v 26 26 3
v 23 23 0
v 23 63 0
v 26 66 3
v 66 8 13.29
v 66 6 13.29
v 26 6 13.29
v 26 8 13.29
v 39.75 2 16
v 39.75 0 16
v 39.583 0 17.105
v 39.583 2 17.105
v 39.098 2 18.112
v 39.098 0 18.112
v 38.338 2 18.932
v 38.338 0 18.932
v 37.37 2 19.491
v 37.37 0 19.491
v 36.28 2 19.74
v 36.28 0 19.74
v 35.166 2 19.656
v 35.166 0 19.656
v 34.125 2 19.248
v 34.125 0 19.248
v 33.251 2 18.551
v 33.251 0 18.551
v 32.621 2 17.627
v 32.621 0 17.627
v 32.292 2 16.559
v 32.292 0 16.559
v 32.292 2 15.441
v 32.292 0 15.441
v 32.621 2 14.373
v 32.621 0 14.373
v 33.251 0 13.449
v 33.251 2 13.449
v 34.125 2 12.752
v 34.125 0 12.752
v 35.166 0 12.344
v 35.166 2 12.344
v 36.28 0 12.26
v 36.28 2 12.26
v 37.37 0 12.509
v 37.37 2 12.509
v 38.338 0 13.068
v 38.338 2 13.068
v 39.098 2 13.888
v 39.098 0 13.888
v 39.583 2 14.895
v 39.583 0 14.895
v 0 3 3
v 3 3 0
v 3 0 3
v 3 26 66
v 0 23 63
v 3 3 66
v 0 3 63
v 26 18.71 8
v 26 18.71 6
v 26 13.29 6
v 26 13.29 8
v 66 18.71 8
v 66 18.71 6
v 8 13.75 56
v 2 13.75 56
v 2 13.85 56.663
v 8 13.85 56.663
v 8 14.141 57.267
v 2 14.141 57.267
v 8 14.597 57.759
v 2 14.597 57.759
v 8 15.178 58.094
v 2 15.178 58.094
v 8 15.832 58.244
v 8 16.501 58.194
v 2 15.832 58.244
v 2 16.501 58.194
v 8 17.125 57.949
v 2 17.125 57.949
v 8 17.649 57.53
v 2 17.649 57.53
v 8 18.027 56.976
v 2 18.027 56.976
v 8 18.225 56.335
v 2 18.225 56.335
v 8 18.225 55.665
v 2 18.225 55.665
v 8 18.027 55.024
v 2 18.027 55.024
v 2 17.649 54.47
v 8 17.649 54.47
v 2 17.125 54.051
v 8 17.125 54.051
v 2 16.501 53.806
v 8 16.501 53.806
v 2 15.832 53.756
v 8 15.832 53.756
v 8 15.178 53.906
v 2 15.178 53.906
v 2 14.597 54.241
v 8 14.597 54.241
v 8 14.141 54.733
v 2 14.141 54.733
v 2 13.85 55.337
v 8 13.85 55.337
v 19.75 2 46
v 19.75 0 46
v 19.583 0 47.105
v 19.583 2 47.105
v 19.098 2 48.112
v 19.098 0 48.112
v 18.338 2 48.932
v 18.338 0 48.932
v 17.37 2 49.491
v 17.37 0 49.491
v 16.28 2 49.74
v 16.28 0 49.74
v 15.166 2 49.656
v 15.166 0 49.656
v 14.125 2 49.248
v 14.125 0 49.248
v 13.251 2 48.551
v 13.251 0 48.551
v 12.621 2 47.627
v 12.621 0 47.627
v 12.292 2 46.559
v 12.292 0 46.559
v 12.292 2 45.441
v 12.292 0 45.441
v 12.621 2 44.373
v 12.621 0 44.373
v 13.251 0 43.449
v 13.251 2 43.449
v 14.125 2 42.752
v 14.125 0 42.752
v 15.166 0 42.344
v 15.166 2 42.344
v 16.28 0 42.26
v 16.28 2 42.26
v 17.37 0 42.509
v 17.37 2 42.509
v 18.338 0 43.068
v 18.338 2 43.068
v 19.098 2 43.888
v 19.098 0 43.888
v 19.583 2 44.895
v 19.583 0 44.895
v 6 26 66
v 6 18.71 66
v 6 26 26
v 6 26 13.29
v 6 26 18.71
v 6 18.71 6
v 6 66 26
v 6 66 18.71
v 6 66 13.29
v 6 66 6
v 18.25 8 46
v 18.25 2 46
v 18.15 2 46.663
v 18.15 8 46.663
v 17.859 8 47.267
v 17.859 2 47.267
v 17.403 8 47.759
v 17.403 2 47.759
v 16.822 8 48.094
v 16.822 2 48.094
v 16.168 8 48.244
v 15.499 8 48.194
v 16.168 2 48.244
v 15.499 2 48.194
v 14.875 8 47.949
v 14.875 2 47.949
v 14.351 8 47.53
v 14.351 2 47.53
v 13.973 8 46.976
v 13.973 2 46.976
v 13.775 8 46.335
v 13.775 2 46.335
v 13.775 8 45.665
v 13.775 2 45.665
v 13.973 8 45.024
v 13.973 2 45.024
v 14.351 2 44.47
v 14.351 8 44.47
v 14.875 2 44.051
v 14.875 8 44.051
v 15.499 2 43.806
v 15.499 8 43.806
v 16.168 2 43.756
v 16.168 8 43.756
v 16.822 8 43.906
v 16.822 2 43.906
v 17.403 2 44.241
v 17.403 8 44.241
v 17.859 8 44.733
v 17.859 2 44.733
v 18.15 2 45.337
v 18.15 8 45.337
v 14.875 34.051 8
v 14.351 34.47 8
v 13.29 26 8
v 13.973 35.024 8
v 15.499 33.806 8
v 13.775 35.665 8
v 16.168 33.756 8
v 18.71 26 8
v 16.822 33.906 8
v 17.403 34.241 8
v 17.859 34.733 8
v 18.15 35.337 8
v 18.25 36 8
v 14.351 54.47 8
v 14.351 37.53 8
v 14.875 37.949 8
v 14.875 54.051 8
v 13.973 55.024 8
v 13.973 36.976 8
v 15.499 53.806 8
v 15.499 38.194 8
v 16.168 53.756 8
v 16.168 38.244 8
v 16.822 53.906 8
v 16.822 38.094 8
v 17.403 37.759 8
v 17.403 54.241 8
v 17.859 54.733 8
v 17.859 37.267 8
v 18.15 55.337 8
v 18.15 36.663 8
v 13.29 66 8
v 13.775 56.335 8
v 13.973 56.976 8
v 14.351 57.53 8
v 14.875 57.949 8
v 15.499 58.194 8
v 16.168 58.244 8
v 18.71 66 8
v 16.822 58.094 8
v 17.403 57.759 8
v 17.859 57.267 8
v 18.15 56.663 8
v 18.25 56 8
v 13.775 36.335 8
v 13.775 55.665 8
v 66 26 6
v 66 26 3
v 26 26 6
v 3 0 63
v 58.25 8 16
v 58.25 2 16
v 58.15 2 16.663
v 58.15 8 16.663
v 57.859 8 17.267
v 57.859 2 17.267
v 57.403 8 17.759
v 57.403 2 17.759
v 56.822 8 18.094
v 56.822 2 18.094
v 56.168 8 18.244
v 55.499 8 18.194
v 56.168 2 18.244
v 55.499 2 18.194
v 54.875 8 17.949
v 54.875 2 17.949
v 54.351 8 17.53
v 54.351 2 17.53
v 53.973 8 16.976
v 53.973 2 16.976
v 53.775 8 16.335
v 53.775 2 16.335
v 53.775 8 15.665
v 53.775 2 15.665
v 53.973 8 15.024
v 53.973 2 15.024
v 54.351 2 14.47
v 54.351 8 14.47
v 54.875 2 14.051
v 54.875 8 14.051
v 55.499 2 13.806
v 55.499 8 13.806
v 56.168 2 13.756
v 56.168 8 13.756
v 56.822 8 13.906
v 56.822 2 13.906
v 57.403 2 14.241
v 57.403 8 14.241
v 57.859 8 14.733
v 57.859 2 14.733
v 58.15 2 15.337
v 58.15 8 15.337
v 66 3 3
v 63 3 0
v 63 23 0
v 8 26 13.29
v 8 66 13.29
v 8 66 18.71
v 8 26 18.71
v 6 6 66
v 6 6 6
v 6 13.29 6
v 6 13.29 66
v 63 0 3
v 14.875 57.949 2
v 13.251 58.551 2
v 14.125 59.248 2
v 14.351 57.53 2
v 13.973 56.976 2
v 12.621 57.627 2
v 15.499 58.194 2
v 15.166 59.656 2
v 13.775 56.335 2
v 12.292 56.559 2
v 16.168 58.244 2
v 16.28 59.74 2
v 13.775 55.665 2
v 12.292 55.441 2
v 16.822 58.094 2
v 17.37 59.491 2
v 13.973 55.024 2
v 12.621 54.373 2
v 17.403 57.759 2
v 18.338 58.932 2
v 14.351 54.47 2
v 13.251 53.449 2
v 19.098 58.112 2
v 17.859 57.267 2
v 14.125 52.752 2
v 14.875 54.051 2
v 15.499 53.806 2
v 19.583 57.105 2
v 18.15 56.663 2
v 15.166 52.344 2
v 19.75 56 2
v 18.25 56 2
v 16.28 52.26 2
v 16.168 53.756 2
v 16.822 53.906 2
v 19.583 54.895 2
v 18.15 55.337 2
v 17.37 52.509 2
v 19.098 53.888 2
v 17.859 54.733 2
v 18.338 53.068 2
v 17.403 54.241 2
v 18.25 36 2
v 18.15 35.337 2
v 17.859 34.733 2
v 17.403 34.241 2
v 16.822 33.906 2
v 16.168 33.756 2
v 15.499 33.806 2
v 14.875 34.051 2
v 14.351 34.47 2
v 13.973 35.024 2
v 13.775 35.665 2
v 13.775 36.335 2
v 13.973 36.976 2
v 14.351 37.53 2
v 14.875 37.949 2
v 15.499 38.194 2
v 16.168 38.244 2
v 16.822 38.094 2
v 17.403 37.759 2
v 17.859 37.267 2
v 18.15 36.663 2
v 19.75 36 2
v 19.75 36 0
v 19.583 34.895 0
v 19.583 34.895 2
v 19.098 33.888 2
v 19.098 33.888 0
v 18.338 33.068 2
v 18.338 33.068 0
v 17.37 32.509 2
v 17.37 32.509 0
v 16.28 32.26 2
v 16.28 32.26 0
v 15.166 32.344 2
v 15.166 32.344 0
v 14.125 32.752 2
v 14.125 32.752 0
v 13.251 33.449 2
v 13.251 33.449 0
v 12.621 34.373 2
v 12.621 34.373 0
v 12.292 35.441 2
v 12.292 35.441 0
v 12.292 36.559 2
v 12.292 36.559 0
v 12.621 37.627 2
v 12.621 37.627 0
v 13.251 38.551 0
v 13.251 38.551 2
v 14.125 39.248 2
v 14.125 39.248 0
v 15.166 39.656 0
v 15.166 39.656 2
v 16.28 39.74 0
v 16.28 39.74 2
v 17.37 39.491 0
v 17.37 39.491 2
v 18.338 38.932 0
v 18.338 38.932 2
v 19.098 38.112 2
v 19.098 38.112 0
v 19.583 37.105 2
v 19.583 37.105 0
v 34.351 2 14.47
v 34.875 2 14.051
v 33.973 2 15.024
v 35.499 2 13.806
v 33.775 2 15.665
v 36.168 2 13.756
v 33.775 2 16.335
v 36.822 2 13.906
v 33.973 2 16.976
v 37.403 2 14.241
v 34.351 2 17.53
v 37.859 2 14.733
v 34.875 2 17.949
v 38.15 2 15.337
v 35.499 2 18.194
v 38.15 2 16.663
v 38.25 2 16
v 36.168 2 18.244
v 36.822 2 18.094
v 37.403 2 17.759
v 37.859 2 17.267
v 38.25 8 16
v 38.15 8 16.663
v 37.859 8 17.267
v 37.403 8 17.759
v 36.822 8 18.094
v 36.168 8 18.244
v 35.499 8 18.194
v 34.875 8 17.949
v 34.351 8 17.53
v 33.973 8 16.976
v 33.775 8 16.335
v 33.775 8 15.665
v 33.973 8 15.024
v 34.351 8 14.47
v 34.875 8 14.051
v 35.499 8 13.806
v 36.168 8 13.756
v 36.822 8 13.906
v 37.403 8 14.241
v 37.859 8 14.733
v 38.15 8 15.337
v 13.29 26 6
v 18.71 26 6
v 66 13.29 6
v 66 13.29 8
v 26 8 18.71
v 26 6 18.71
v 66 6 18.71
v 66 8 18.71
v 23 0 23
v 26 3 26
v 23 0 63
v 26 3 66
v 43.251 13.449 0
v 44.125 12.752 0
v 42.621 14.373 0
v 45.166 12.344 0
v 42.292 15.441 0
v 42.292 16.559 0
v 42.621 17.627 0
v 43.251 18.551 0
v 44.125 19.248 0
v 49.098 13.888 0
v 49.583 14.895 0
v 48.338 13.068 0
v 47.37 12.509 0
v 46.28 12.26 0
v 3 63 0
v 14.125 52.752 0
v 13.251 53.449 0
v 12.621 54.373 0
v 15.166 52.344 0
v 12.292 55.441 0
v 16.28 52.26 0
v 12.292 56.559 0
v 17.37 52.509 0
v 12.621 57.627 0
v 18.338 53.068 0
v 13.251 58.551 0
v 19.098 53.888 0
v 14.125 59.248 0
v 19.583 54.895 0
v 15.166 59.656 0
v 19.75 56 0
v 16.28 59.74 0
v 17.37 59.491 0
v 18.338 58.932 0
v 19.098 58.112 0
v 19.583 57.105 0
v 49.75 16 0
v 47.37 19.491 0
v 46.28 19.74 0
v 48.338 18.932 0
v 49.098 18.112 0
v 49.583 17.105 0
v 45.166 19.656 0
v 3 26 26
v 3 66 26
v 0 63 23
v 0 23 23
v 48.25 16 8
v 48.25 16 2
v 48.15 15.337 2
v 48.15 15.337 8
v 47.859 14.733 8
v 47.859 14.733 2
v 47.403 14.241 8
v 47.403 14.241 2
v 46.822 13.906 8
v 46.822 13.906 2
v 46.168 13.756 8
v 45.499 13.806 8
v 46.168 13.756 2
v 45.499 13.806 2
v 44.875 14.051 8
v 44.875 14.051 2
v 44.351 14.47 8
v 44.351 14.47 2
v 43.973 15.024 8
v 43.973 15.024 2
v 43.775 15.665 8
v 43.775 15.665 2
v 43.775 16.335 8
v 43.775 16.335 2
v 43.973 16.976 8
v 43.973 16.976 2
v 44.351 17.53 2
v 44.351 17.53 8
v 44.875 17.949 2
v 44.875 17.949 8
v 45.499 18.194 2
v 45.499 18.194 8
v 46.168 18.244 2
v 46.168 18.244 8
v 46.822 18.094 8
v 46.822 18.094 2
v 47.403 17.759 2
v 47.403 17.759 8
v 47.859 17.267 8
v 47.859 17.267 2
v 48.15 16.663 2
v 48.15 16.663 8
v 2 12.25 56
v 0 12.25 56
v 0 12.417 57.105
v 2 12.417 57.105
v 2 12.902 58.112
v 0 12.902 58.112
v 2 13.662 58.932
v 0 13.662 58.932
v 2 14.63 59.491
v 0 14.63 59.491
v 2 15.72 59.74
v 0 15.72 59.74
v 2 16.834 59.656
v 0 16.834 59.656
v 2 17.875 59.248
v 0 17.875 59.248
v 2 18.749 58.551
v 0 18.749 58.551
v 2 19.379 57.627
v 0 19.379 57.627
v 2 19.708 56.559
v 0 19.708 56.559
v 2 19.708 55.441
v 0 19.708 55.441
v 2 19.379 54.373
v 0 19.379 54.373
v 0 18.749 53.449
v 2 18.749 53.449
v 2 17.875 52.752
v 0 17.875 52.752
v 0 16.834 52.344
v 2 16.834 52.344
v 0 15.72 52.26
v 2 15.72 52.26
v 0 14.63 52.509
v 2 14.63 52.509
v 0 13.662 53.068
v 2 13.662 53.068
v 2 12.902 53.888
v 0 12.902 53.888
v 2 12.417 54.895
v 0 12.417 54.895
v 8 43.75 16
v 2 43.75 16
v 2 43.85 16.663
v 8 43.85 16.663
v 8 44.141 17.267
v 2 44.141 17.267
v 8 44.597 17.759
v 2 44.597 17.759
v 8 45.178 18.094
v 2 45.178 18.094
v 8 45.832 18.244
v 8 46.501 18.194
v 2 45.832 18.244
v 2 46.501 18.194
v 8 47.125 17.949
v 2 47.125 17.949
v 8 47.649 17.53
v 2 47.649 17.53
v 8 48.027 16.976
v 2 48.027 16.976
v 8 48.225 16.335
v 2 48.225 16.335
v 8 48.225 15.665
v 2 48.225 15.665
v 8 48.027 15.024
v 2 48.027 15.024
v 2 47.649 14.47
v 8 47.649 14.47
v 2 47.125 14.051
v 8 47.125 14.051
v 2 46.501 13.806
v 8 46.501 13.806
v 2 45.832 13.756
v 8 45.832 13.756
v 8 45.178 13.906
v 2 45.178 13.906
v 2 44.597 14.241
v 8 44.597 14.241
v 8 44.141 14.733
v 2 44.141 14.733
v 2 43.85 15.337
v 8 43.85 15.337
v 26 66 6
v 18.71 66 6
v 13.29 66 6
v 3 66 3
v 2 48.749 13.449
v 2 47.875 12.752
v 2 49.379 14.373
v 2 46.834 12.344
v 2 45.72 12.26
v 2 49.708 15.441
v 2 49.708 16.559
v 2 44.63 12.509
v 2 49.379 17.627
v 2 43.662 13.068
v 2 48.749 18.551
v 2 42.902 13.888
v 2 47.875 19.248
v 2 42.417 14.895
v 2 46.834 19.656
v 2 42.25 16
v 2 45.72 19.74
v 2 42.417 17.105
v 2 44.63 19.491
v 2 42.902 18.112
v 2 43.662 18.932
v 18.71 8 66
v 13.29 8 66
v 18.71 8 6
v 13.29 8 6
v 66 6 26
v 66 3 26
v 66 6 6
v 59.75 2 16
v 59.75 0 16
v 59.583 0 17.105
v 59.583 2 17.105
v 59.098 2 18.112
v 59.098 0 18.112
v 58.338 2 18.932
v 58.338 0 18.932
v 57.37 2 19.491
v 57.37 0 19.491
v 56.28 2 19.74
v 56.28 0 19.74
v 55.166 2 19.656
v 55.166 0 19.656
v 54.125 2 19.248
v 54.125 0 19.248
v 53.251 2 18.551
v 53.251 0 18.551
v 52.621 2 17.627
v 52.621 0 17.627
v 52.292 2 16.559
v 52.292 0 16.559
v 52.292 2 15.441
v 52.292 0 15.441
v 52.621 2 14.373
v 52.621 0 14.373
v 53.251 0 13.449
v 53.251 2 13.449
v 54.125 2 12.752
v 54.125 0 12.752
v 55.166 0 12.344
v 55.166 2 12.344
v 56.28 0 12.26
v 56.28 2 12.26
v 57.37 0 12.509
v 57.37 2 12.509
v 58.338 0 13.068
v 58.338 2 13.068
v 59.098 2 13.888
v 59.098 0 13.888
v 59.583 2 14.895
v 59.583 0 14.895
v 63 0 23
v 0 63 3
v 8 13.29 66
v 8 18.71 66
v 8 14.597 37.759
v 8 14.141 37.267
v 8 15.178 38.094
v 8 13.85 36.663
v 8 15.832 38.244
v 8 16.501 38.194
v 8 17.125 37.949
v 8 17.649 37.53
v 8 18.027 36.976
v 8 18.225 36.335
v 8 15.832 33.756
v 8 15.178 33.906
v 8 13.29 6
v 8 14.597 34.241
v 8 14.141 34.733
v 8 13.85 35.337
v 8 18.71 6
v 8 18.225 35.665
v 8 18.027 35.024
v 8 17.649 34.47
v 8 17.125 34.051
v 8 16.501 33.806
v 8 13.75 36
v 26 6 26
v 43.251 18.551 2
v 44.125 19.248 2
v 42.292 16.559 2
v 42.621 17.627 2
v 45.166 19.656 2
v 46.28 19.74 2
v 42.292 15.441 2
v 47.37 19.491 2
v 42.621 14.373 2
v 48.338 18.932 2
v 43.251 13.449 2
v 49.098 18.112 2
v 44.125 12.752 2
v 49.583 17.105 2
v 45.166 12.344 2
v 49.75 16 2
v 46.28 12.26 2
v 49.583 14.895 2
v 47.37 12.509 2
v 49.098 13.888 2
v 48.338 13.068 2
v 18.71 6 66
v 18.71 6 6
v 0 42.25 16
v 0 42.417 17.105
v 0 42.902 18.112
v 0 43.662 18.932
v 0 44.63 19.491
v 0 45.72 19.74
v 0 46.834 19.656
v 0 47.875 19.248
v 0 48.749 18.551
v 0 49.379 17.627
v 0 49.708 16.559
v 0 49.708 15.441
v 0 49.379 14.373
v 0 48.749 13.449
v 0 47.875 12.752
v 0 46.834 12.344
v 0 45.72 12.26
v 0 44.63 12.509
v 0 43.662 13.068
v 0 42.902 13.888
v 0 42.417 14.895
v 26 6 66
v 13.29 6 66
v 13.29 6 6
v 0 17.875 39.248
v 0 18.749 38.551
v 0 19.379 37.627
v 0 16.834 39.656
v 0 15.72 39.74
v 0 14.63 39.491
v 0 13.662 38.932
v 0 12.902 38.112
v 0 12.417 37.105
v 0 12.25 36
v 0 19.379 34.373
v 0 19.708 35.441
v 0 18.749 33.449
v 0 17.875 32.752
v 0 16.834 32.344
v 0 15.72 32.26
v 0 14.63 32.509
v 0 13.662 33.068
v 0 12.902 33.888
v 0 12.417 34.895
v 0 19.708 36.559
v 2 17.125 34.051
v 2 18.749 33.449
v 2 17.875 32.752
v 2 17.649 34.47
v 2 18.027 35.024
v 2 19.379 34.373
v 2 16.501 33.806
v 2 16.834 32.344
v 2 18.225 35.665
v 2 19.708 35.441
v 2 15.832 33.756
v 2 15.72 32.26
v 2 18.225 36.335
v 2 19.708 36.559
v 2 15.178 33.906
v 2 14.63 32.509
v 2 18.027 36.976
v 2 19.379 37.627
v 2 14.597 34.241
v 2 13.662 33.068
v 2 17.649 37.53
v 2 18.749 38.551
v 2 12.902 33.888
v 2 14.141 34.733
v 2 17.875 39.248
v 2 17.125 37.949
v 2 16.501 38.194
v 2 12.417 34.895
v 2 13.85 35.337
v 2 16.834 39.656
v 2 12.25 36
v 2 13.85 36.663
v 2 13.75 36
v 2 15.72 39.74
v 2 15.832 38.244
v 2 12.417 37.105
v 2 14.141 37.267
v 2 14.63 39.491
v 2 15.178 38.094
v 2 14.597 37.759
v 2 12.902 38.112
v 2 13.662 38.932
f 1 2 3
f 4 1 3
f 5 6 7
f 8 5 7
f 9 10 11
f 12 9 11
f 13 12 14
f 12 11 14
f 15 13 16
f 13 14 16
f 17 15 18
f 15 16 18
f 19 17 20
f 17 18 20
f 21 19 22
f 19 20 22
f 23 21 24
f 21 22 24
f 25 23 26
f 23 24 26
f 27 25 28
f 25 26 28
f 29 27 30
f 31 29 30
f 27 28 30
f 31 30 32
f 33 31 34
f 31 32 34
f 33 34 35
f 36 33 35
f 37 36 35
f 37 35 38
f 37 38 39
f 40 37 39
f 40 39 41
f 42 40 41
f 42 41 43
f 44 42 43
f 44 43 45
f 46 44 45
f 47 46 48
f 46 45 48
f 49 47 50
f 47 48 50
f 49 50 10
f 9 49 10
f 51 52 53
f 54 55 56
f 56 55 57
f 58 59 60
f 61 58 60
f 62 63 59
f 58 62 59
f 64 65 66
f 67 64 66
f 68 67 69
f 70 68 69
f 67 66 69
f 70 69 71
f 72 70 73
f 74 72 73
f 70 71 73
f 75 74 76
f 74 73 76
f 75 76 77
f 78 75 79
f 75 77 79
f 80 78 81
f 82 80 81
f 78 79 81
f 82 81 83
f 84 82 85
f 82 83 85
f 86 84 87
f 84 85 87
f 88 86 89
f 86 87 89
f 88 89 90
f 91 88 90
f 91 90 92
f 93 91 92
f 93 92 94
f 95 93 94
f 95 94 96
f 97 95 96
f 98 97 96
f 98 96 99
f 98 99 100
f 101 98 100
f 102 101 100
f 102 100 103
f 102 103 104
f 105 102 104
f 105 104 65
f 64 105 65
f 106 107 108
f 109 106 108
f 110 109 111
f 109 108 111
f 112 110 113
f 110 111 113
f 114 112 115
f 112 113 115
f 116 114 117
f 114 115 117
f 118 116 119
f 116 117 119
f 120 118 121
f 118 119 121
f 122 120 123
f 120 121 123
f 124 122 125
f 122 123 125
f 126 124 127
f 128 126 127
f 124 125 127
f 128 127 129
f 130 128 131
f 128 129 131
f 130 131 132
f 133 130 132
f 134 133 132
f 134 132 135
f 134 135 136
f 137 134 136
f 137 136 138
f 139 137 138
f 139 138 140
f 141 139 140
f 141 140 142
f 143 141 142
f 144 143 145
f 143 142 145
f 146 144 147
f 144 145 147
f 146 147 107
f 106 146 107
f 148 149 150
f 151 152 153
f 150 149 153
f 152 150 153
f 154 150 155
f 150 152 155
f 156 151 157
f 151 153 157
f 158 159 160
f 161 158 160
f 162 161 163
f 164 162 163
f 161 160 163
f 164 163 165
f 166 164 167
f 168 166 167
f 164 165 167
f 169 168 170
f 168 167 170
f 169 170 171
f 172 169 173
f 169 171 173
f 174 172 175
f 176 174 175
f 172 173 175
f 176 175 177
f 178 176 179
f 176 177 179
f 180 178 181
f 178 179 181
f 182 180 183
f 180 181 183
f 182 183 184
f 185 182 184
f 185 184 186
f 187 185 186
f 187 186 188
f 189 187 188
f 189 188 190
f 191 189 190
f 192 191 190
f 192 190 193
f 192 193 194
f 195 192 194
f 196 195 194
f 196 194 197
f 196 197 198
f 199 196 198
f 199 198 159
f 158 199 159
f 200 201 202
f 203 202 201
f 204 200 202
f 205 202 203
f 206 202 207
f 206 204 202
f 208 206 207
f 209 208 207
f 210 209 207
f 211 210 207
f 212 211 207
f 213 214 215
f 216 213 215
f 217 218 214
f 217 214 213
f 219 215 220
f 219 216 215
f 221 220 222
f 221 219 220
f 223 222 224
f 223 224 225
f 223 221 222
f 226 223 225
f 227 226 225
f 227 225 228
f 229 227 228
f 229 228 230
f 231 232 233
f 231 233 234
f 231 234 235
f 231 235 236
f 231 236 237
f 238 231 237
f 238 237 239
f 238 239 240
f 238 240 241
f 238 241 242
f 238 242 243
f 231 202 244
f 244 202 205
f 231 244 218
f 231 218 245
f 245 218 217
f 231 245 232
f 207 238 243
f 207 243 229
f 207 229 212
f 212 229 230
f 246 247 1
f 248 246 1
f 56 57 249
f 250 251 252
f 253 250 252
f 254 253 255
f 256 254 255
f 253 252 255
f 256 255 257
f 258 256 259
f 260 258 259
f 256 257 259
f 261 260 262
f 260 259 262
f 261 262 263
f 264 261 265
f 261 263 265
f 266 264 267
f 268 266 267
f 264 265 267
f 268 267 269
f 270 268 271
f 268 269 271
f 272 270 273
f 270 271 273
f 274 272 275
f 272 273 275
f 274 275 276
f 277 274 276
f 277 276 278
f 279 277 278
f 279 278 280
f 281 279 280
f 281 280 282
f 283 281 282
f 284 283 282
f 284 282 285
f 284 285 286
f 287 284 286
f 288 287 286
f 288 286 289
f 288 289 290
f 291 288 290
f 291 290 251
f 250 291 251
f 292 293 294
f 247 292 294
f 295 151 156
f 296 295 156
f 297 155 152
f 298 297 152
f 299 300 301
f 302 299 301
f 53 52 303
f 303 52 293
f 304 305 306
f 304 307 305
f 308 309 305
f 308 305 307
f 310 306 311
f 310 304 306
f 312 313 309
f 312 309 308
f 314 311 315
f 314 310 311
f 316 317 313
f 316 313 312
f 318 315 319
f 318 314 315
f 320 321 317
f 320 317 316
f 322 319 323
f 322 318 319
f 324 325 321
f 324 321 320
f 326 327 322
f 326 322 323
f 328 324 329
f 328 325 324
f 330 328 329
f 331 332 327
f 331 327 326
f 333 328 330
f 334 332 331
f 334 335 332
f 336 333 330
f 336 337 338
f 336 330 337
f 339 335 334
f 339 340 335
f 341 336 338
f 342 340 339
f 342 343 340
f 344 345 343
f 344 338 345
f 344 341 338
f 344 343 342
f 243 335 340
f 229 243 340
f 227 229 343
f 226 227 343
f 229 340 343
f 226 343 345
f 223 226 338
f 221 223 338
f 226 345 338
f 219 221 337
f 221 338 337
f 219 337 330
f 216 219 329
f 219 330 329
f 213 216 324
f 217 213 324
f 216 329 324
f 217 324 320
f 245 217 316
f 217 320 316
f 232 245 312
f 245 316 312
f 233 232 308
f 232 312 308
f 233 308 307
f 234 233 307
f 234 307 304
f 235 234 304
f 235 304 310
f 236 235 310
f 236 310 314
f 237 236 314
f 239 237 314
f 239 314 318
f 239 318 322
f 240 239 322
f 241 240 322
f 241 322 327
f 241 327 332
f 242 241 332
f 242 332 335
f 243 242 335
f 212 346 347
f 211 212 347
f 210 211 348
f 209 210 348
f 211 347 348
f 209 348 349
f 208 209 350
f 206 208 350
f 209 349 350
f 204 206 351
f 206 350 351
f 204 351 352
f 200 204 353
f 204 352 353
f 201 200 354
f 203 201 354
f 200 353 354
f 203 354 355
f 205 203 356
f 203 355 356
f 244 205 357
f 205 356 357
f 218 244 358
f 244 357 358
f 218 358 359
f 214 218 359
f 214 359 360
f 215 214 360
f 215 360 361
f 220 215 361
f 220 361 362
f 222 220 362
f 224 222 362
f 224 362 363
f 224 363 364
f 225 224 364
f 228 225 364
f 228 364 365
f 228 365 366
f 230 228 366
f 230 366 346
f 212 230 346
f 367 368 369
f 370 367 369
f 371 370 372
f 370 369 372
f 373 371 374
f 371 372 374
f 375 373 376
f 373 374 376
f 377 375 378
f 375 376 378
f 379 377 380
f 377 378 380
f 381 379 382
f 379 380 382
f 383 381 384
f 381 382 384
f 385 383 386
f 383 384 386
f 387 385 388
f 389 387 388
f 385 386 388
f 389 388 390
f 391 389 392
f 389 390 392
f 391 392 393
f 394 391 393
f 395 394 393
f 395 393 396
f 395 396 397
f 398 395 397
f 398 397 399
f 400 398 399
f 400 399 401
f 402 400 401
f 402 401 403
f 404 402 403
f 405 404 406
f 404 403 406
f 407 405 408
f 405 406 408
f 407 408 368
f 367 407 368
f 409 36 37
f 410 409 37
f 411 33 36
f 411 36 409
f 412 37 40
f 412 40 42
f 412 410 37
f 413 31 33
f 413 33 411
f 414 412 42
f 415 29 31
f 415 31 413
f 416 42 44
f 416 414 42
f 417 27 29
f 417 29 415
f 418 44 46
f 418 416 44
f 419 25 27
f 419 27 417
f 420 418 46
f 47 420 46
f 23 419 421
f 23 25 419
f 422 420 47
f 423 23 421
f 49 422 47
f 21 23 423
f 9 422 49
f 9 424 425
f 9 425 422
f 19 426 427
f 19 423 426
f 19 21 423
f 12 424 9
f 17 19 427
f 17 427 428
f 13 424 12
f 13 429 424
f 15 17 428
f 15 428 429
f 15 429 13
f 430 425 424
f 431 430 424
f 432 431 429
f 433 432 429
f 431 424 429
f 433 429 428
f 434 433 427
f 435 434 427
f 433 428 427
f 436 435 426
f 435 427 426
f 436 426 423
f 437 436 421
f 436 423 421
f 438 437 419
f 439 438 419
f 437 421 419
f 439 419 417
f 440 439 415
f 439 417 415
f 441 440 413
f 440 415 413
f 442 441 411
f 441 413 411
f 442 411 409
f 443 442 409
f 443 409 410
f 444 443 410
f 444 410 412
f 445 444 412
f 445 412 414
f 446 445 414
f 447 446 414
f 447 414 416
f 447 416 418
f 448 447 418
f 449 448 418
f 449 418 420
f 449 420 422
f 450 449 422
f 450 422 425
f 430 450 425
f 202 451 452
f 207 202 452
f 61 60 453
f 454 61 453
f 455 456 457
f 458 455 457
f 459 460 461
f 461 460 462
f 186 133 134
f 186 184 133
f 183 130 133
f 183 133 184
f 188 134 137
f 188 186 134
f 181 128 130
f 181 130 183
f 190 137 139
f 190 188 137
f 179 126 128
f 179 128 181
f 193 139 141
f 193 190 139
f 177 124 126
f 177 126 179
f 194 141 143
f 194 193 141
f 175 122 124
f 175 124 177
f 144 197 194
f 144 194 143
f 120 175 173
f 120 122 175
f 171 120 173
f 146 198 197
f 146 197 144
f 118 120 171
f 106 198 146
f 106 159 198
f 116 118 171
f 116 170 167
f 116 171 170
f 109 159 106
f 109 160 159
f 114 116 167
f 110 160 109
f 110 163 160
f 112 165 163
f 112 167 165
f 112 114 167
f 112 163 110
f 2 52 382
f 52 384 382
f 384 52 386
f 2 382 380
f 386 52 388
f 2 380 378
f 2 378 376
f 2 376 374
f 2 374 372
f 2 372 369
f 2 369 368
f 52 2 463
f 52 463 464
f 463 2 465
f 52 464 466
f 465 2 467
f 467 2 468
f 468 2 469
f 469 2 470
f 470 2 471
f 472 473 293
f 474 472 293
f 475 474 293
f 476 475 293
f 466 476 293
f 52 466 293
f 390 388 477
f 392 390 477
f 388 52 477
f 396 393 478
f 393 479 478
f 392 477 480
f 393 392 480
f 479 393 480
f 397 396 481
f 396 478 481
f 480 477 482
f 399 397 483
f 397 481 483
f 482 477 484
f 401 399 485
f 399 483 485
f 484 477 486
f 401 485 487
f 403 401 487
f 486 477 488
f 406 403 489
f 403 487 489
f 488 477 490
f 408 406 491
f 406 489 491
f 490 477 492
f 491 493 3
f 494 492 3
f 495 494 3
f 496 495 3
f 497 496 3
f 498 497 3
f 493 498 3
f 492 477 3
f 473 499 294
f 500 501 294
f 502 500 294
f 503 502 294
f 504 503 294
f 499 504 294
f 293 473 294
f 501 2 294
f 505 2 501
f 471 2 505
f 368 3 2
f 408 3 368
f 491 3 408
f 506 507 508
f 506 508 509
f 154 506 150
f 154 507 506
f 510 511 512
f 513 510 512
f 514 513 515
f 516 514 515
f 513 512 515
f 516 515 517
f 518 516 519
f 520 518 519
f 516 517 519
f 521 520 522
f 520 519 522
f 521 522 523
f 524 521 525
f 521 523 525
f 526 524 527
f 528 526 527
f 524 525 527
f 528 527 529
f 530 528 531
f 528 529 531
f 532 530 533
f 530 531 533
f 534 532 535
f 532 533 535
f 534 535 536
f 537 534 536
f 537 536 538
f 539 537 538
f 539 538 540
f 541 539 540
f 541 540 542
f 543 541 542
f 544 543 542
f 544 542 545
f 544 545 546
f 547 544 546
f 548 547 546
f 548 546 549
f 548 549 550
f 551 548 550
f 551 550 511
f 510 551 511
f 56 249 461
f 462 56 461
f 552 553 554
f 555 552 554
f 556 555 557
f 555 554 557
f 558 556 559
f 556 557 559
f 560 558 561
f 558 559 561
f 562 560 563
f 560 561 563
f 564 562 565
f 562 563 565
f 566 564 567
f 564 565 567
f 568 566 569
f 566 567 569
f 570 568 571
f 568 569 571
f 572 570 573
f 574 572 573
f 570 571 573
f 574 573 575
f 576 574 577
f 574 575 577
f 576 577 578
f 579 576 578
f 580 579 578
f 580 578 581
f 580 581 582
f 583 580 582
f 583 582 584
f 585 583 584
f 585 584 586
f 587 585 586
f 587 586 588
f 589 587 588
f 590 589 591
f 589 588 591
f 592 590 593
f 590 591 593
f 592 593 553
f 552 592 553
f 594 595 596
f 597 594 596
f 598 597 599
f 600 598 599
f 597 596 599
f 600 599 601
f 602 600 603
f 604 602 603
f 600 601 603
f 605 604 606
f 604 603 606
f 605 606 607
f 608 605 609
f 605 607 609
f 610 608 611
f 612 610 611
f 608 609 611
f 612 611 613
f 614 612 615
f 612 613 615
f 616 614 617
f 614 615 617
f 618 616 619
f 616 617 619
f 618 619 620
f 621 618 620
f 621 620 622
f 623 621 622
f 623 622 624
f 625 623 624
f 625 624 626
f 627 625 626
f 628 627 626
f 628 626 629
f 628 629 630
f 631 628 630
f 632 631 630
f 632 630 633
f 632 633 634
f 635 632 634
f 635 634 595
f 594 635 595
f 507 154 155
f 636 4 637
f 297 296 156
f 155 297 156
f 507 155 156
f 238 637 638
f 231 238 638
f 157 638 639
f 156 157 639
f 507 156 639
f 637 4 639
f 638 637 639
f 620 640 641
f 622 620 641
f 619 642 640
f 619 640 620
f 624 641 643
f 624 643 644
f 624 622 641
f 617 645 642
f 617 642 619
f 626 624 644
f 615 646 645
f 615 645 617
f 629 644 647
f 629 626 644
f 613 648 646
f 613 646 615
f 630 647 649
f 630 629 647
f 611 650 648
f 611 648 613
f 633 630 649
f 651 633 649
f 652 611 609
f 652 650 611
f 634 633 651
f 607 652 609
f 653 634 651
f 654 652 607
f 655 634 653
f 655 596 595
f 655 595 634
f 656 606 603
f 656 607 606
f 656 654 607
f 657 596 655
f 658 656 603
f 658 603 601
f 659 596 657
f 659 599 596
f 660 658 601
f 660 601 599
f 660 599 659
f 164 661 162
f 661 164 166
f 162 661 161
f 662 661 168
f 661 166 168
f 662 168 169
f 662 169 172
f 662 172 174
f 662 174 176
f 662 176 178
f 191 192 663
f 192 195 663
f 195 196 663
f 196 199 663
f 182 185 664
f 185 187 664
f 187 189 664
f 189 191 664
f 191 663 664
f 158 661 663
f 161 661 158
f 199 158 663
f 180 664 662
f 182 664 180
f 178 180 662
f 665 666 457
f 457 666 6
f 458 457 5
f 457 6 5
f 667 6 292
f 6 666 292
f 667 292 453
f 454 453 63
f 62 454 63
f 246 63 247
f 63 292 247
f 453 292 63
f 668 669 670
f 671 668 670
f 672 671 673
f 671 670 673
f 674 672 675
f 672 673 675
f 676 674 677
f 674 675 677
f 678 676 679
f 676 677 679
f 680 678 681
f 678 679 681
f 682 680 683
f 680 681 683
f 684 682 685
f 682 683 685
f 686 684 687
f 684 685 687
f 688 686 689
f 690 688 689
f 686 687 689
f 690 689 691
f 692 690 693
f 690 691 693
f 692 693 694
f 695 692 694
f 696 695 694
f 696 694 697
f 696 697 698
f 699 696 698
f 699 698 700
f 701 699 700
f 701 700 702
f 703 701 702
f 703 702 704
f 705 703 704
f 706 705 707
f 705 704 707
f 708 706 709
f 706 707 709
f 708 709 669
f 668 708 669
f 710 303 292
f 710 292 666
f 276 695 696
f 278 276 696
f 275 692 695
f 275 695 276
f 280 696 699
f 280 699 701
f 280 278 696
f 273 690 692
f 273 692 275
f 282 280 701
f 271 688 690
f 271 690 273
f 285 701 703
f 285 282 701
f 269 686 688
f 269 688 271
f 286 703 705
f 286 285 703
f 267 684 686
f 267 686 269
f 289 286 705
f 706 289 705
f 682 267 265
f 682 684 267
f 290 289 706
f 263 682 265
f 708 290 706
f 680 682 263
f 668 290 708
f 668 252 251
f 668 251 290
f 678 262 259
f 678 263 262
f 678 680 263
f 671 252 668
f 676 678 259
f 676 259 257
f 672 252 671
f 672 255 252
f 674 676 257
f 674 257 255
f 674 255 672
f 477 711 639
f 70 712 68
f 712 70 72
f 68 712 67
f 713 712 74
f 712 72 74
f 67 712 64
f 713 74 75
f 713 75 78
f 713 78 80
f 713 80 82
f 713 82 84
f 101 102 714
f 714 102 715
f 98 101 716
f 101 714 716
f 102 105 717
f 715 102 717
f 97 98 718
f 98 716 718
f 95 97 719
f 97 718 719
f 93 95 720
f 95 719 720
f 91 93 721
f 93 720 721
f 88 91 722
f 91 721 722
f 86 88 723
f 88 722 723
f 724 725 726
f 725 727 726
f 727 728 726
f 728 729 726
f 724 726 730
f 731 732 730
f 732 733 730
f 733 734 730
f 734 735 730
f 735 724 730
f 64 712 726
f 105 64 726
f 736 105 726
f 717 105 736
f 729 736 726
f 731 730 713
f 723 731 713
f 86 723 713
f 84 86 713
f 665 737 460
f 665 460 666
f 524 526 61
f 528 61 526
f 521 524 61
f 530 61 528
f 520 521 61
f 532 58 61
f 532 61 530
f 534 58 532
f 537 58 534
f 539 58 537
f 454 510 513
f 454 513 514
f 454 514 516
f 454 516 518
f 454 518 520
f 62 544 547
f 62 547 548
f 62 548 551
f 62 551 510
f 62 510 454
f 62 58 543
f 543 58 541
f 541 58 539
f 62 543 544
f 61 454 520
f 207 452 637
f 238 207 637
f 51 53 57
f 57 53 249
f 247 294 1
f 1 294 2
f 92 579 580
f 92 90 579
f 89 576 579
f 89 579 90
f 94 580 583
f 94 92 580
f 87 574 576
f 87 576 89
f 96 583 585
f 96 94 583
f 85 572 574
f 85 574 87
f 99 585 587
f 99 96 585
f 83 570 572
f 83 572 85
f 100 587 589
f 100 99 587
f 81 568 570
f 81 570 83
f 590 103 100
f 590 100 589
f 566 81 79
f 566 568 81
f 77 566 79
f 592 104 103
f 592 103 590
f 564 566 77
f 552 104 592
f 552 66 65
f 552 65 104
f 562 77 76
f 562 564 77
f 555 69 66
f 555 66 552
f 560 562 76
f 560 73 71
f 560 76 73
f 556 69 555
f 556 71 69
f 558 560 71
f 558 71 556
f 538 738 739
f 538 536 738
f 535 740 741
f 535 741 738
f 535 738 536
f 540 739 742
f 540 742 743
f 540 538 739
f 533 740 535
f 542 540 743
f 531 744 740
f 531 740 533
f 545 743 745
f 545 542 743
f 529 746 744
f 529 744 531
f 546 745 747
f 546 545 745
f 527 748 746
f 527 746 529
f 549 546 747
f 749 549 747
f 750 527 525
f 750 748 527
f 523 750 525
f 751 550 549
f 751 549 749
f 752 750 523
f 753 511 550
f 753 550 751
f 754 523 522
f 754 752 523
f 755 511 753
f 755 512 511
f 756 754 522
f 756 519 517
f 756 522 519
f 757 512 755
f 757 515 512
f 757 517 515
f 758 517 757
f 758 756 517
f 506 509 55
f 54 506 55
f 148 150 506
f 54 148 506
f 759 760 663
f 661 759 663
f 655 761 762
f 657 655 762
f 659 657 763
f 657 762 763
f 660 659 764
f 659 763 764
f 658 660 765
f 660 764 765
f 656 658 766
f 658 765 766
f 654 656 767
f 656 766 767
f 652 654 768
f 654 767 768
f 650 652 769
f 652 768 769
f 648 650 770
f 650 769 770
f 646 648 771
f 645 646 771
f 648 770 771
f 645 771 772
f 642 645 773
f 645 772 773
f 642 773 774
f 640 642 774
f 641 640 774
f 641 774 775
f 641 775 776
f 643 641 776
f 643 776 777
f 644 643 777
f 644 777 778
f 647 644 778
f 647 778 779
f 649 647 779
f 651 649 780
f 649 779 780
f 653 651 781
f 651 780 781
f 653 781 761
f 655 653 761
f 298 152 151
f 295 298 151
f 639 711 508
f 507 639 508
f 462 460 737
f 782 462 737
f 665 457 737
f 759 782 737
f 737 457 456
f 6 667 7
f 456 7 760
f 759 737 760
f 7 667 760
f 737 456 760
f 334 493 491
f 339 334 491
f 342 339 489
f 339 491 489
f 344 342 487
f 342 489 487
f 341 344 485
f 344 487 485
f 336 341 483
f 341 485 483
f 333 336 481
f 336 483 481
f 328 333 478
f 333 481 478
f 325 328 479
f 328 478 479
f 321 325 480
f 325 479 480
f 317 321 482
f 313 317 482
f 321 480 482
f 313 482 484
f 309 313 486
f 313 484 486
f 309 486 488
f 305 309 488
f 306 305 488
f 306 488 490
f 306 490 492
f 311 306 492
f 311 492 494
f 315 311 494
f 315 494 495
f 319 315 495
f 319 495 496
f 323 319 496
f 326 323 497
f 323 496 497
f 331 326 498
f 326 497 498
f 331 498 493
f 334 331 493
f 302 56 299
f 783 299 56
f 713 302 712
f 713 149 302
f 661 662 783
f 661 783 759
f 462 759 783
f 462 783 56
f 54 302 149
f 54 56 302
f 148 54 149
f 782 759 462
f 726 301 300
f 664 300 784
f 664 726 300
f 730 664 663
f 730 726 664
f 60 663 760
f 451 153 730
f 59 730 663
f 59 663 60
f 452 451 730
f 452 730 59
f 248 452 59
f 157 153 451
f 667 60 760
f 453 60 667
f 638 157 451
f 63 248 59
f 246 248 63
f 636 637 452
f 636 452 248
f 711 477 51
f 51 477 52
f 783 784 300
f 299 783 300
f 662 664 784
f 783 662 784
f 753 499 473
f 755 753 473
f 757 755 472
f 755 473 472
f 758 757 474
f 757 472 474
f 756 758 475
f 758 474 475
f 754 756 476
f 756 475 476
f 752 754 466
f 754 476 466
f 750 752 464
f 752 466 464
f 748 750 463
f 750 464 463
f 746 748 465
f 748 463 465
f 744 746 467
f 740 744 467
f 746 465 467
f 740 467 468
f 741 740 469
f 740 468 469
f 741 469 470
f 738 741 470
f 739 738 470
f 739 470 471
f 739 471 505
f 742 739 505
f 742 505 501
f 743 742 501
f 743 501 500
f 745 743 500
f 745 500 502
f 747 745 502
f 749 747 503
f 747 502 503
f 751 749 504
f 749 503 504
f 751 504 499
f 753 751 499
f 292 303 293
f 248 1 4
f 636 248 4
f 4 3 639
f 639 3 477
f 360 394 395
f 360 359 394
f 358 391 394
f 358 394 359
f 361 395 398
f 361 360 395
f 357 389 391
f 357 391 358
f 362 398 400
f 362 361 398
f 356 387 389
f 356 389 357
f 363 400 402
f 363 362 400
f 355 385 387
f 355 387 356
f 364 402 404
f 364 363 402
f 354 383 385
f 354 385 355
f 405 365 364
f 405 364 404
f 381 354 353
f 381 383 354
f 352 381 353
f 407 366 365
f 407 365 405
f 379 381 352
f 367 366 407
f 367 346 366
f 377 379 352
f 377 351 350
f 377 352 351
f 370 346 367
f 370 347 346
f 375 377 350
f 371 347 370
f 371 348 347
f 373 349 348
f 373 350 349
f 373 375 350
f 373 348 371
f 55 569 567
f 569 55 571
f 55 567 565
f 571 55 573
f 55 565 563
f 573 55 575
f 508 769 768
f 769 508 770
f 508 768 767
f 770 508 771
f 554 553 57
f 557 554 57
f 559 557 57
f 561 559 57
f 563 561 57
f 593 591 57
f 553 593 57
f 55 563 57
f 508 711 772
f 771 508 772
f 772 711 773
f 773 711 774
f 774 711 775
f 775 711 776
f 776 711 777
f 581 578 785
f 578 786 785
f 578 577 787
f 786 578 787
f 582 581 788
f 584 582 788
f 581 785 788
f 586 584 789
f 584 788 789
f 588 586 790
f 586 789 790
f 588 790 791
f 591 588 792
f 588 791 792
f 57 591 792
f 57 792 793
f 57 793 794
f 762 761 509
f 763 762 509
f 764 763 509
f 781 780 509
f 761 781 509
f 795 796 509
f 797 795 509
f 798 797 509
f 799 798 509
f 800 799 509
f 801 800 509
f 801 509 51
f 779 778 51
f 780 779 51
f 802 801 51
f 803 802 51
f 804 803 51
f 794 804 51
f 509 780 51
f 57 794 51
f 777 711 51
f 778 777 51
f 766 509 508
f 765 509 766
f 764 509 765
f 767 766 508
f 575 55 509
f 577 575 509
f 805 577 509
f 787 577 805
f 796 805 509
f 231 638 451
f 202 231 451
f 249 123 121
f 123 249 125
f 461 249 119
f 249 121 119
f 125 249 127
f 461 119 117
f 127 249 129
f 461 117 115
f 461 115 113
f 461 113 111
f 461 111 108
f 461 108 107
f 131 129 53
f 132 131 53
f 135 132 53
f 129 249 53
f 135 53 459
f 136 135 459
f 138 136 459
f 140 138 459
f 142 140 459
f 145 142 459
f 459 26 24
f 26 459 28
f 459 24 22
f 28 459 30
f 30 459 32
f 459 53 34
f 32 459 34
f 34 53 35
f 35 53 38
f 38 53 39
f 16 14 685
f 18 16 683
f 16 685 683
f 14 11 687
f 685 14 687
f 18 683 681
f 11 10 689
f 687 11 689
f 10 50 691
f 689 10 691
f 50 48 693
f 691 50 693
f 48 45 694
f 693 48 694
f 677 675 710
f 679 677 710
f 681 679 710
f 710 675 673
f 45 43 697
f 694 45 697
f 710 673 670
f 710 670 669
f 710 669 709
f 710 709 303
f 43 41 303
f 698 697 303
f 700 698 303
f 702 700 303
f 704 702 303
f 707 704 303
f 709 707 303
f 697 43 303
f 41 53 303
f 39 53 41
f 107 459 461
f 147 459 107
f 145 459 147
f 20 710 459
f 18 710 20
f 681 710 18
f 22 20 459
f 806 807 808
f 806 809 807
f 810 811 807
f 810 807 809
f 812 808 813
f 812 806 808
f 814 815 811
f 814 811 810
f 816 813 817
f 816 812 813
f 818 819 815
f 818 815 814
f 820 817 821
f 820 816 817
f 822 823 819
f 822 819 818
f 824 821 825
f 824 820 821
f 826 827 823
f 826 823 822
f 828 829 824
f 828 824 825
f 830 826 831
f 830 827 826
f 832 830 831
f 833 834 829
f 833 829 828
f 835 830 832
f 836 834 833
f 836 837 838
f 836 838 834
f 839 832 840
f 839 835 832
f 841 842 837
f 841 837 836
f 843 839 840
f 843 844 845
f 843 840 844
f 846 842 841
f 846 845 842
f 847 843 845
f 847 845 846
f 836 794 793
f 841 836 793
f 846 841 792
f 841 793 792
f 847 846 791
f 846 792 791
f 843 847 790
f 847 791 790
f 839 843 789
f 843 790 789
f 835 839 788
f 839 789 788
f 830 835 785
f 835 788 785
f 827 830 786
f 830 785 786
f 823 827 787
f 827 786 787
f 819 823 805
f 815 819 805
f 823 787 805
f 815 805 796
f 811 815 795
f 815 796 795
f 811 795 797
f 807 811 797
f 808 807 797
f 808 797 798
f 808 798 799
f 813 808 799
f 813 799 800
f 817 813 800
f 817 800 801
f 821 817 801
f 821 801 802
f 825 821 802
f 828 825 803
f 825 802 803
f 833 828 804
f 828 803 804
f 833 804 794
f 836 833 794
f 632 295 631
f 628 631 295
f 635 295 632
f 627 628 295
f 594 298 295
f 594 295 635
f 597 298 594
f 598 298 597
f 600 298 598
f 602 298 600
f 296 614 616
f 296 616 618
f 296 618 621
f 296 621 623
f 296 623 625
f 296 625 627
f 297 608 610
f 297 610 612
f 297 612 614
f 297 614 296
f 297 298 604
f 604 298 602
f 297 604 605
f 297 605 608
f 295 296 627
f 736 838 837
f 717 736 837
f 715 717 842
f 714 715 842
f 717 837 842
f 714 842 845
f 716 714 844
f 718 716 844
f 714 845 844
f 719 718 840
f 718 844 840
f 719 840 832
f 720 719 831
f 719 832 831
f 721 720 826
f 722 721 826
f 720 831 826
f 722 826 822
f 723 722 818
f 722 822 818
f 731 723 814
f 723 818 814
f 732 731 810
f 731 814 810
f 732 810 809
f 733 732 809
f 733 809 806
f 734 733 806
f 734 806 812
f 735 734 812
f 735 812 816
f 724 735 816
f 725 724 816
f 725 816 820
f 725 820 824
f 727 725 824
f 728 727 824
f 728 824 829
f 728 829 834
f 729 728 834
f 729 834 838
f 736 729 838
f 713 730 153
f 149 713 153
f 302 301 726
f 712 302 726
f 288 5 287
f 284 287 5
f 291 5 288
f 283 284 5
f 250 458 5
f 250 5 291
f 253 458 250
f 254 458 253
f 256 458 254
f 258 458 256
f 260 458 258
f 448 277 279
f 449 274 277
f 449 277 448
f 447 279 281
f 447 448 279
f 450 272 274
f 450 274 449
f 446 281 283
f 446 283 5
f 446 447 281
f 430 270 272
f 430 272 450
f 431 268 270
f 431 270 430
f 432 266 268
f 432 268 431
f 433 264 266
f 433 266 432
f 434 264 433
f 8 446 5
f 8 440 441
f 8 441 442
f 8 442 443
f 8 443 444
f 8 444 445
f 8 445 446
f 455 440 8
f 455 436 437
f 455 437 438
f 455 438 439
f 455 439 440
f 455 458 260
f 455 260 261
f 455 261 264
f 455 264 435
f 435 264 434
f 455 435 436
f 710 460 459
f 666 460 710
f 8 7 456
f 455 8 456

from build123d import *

# Parameters (mm, degrees)
F1_DEPTH  = 6
F3_DEPTH  = 20
F5_DEPTH  = 40
F7_DEPTH  = 60
F9_DEPTH  = 2
F11_DEPTH = 2
F13_DEPTH = 2
F14_R     = 2.25
F15_DEPTH = 8
F16_R     = 2.25
F17_DEPTH = 8
F18_R     = 2.25
F19_DEPTH = 8
F20_R     = 3.75
F21_DEPTH = 2
F22_R     = 3.75
F23_DEPTH = 2
F24_R     = 3.75
F25_DEPTH = 2
F26_SIZE  = 3


with BuildPart() as f1:
    # F0 (on Top) → F1 (new body)
    with BuildSketch(Plane.XY):
        Polygon((0, 66), (0, 0), (66, 0), (66, 26), (26, 26), (26, 66), align=None)
    extrude(amount=F1_DEPTH)

    # F2 (on face) → F3 (join)
    with BuildSketch(Plane.XY.offset(6)):
        Polygon((6, 66), (0, 66), (0, 0), (66, 0), (66, 6), (6, 6), align=None)
    extrude(amount=F3_DEPTH)

    # F4 (on face) → F5 (join)
    with BuildSketch(Plane.XY.offset(26)):
        Polygon((6, 6), (6, 26), (0, 26), (0, 0), (26, 0), (26, 6), align=None)
    extrude(amount=F5_DEPTH)

    # F6 (on face) → F7 (join)
    with BuildSketch(Plane.XY.offset(6)):
        Polygon((13.29, 6), (16, 6), (18.71, 6), (18.71, 8), (13.29, 8), align=None)
        Polygon((6, 18.71), (6, 16), (6, 13.29), (8, 13.29), (8, 18.71), align=None)
    extrude(amount=F7_DEPTH)

    # F8 (on face) → F9 (join)
    with BuildSketch(Plane.XY.offset(6)):
        Polygon((66, 13.29), (66, 16), (66, 18.71), (26, 18.71), (26, 13.29), align=None)
        Polygon((18.71, 66), (16, 66), (13.29, 66), (13.29, 26), (18.71, 26), align=None)
    extrude(amount=F9_DEPTH)

    # F10 (on face) → F11 (join)
    with BuildSketch(Plane(origin=(0, 6, 0), x_dir=(-1, 0, 0), z_dir=(0, 1, 0))):
        Polygon((-66, 18.71), (-66, 16), (-66, 13.29), (-26, 13.29), (-26, 16), (-26, 18.71), align=None)
    extrude(amount=F11_DEPTH)

    # F12 (on face) → F13 (join)
    with BuildSketch(Plane.YZ.offset(6)):
        Polygon((66, 13.29), (66, 16), (66, 18.71), (26, 18.71), (26, 13.29), align=None)
    extrude(amount=F13_DEPTH)

    # F14 (on face) → F15 (cut, through all)
    with BuildSketch(Plane.XZ):
        with Locations((56, 16)):
            Circle(F14_R)
        with Locations((16, 46)):
            Circle(F14_R)
        with Locations((36, 16)):
            Circle(F14_R)
    extrude(amount=-F15_DEPTH, mode=Mode.SUBTRACT)

    # F16 (on face) → F17 (cut, through all)
    with BuildSketch(Plane(origin=(0, 0, 0), x_dir=(0, -1, 0), z_dir=(-1, 0, 0))):
        with Locations((-16, 56)):
            Circle(F16_R)
        with Locations((-46, 16)):
            Circle(F16_R)
        with Locations((-16, 36)):
            Circle(F16_R)
    extrude(amount=-F17_DEPTH, mode=Mode.SUBTRACT)

    # F18 (on face) → F19 (cut, through all)
    with BuildSketch(Plane(origin=(0, 0, 0), x_dir=(1, 0, 0), z_dir=(0, 0, -1))):
        with Locations((46, -16)):
            Circle(F18_R)
        with Locations((16, -56)):
            Circle(F18_R)
        with Locations((16, -36)):
            Circle(F18_R)
    extrude(amount=-F19_DEPTH, mode=Mode.SUBTRACT)

    # F20 (on face) → F21 (cut)
    with BuildSketch(Plane.XZ):
        with Locations((16, 46)):
            Circle(F20_R)
        with Locations((36, 16)):
            Circle(F20_R)
        with Locations((56, 16)):
            Circle(F20_R)
    extrude(amount=-F21_DEPTH, mode=Mode.SUBTRACT)

    # F22 (on face) → F23 (cut)
    with BuildSketch(Plane(origin=(0, 0, 0), x_dir=(0, -1, 0), z_dir=(-1, 0, 0))):
        with Locations((-16, 56)):
            Circle(F22_R)
        with Locations((-46, 16)):
            Circle(F22_R)
        with Locations((-16, 36)):
            Circle(F22_R)
    extrude(amount=-F23_DEPTH, mode=Mode.SUBTRACT)

    # F24 (on face) → F25 (cut)
    with BuildSketch(Plane(origin=(0, 0, 0), x_dir=(1, 0, 0), z_dir=(0, 0, -1))):
        with Locations((16, -56)):
            Circle(F24_R)
        with Locations((46, -16)):
            Circle(F24_R)
        with Locations((16, -36)):
            Circle(F24_R)
    extrude(amount=-F25_DEPTH, mode=Mode.SUBTRACT)

    # F26
    f26_edges = [f1.edges().sort_by_distance(p)[0] for p in [
        (33, 0, 0),
        (0, 33, 0),
        (0, 0, 33),
        (0, 26, 46),
        (0, 46, 26),
        (26, 0, 46),
        (46, 0, 26),
        (0, 13, 66),
        (13, 0, 66),
        (0, 66, 13),
        (13, 66, 0),
        (66, 0, 13),
        (66, 13, 0),
        (46, 26, 0),
        (26, 46, 0),
    ]]
    chamfer(f26_edges, length=F26_SIZE)


solid = f1.part
